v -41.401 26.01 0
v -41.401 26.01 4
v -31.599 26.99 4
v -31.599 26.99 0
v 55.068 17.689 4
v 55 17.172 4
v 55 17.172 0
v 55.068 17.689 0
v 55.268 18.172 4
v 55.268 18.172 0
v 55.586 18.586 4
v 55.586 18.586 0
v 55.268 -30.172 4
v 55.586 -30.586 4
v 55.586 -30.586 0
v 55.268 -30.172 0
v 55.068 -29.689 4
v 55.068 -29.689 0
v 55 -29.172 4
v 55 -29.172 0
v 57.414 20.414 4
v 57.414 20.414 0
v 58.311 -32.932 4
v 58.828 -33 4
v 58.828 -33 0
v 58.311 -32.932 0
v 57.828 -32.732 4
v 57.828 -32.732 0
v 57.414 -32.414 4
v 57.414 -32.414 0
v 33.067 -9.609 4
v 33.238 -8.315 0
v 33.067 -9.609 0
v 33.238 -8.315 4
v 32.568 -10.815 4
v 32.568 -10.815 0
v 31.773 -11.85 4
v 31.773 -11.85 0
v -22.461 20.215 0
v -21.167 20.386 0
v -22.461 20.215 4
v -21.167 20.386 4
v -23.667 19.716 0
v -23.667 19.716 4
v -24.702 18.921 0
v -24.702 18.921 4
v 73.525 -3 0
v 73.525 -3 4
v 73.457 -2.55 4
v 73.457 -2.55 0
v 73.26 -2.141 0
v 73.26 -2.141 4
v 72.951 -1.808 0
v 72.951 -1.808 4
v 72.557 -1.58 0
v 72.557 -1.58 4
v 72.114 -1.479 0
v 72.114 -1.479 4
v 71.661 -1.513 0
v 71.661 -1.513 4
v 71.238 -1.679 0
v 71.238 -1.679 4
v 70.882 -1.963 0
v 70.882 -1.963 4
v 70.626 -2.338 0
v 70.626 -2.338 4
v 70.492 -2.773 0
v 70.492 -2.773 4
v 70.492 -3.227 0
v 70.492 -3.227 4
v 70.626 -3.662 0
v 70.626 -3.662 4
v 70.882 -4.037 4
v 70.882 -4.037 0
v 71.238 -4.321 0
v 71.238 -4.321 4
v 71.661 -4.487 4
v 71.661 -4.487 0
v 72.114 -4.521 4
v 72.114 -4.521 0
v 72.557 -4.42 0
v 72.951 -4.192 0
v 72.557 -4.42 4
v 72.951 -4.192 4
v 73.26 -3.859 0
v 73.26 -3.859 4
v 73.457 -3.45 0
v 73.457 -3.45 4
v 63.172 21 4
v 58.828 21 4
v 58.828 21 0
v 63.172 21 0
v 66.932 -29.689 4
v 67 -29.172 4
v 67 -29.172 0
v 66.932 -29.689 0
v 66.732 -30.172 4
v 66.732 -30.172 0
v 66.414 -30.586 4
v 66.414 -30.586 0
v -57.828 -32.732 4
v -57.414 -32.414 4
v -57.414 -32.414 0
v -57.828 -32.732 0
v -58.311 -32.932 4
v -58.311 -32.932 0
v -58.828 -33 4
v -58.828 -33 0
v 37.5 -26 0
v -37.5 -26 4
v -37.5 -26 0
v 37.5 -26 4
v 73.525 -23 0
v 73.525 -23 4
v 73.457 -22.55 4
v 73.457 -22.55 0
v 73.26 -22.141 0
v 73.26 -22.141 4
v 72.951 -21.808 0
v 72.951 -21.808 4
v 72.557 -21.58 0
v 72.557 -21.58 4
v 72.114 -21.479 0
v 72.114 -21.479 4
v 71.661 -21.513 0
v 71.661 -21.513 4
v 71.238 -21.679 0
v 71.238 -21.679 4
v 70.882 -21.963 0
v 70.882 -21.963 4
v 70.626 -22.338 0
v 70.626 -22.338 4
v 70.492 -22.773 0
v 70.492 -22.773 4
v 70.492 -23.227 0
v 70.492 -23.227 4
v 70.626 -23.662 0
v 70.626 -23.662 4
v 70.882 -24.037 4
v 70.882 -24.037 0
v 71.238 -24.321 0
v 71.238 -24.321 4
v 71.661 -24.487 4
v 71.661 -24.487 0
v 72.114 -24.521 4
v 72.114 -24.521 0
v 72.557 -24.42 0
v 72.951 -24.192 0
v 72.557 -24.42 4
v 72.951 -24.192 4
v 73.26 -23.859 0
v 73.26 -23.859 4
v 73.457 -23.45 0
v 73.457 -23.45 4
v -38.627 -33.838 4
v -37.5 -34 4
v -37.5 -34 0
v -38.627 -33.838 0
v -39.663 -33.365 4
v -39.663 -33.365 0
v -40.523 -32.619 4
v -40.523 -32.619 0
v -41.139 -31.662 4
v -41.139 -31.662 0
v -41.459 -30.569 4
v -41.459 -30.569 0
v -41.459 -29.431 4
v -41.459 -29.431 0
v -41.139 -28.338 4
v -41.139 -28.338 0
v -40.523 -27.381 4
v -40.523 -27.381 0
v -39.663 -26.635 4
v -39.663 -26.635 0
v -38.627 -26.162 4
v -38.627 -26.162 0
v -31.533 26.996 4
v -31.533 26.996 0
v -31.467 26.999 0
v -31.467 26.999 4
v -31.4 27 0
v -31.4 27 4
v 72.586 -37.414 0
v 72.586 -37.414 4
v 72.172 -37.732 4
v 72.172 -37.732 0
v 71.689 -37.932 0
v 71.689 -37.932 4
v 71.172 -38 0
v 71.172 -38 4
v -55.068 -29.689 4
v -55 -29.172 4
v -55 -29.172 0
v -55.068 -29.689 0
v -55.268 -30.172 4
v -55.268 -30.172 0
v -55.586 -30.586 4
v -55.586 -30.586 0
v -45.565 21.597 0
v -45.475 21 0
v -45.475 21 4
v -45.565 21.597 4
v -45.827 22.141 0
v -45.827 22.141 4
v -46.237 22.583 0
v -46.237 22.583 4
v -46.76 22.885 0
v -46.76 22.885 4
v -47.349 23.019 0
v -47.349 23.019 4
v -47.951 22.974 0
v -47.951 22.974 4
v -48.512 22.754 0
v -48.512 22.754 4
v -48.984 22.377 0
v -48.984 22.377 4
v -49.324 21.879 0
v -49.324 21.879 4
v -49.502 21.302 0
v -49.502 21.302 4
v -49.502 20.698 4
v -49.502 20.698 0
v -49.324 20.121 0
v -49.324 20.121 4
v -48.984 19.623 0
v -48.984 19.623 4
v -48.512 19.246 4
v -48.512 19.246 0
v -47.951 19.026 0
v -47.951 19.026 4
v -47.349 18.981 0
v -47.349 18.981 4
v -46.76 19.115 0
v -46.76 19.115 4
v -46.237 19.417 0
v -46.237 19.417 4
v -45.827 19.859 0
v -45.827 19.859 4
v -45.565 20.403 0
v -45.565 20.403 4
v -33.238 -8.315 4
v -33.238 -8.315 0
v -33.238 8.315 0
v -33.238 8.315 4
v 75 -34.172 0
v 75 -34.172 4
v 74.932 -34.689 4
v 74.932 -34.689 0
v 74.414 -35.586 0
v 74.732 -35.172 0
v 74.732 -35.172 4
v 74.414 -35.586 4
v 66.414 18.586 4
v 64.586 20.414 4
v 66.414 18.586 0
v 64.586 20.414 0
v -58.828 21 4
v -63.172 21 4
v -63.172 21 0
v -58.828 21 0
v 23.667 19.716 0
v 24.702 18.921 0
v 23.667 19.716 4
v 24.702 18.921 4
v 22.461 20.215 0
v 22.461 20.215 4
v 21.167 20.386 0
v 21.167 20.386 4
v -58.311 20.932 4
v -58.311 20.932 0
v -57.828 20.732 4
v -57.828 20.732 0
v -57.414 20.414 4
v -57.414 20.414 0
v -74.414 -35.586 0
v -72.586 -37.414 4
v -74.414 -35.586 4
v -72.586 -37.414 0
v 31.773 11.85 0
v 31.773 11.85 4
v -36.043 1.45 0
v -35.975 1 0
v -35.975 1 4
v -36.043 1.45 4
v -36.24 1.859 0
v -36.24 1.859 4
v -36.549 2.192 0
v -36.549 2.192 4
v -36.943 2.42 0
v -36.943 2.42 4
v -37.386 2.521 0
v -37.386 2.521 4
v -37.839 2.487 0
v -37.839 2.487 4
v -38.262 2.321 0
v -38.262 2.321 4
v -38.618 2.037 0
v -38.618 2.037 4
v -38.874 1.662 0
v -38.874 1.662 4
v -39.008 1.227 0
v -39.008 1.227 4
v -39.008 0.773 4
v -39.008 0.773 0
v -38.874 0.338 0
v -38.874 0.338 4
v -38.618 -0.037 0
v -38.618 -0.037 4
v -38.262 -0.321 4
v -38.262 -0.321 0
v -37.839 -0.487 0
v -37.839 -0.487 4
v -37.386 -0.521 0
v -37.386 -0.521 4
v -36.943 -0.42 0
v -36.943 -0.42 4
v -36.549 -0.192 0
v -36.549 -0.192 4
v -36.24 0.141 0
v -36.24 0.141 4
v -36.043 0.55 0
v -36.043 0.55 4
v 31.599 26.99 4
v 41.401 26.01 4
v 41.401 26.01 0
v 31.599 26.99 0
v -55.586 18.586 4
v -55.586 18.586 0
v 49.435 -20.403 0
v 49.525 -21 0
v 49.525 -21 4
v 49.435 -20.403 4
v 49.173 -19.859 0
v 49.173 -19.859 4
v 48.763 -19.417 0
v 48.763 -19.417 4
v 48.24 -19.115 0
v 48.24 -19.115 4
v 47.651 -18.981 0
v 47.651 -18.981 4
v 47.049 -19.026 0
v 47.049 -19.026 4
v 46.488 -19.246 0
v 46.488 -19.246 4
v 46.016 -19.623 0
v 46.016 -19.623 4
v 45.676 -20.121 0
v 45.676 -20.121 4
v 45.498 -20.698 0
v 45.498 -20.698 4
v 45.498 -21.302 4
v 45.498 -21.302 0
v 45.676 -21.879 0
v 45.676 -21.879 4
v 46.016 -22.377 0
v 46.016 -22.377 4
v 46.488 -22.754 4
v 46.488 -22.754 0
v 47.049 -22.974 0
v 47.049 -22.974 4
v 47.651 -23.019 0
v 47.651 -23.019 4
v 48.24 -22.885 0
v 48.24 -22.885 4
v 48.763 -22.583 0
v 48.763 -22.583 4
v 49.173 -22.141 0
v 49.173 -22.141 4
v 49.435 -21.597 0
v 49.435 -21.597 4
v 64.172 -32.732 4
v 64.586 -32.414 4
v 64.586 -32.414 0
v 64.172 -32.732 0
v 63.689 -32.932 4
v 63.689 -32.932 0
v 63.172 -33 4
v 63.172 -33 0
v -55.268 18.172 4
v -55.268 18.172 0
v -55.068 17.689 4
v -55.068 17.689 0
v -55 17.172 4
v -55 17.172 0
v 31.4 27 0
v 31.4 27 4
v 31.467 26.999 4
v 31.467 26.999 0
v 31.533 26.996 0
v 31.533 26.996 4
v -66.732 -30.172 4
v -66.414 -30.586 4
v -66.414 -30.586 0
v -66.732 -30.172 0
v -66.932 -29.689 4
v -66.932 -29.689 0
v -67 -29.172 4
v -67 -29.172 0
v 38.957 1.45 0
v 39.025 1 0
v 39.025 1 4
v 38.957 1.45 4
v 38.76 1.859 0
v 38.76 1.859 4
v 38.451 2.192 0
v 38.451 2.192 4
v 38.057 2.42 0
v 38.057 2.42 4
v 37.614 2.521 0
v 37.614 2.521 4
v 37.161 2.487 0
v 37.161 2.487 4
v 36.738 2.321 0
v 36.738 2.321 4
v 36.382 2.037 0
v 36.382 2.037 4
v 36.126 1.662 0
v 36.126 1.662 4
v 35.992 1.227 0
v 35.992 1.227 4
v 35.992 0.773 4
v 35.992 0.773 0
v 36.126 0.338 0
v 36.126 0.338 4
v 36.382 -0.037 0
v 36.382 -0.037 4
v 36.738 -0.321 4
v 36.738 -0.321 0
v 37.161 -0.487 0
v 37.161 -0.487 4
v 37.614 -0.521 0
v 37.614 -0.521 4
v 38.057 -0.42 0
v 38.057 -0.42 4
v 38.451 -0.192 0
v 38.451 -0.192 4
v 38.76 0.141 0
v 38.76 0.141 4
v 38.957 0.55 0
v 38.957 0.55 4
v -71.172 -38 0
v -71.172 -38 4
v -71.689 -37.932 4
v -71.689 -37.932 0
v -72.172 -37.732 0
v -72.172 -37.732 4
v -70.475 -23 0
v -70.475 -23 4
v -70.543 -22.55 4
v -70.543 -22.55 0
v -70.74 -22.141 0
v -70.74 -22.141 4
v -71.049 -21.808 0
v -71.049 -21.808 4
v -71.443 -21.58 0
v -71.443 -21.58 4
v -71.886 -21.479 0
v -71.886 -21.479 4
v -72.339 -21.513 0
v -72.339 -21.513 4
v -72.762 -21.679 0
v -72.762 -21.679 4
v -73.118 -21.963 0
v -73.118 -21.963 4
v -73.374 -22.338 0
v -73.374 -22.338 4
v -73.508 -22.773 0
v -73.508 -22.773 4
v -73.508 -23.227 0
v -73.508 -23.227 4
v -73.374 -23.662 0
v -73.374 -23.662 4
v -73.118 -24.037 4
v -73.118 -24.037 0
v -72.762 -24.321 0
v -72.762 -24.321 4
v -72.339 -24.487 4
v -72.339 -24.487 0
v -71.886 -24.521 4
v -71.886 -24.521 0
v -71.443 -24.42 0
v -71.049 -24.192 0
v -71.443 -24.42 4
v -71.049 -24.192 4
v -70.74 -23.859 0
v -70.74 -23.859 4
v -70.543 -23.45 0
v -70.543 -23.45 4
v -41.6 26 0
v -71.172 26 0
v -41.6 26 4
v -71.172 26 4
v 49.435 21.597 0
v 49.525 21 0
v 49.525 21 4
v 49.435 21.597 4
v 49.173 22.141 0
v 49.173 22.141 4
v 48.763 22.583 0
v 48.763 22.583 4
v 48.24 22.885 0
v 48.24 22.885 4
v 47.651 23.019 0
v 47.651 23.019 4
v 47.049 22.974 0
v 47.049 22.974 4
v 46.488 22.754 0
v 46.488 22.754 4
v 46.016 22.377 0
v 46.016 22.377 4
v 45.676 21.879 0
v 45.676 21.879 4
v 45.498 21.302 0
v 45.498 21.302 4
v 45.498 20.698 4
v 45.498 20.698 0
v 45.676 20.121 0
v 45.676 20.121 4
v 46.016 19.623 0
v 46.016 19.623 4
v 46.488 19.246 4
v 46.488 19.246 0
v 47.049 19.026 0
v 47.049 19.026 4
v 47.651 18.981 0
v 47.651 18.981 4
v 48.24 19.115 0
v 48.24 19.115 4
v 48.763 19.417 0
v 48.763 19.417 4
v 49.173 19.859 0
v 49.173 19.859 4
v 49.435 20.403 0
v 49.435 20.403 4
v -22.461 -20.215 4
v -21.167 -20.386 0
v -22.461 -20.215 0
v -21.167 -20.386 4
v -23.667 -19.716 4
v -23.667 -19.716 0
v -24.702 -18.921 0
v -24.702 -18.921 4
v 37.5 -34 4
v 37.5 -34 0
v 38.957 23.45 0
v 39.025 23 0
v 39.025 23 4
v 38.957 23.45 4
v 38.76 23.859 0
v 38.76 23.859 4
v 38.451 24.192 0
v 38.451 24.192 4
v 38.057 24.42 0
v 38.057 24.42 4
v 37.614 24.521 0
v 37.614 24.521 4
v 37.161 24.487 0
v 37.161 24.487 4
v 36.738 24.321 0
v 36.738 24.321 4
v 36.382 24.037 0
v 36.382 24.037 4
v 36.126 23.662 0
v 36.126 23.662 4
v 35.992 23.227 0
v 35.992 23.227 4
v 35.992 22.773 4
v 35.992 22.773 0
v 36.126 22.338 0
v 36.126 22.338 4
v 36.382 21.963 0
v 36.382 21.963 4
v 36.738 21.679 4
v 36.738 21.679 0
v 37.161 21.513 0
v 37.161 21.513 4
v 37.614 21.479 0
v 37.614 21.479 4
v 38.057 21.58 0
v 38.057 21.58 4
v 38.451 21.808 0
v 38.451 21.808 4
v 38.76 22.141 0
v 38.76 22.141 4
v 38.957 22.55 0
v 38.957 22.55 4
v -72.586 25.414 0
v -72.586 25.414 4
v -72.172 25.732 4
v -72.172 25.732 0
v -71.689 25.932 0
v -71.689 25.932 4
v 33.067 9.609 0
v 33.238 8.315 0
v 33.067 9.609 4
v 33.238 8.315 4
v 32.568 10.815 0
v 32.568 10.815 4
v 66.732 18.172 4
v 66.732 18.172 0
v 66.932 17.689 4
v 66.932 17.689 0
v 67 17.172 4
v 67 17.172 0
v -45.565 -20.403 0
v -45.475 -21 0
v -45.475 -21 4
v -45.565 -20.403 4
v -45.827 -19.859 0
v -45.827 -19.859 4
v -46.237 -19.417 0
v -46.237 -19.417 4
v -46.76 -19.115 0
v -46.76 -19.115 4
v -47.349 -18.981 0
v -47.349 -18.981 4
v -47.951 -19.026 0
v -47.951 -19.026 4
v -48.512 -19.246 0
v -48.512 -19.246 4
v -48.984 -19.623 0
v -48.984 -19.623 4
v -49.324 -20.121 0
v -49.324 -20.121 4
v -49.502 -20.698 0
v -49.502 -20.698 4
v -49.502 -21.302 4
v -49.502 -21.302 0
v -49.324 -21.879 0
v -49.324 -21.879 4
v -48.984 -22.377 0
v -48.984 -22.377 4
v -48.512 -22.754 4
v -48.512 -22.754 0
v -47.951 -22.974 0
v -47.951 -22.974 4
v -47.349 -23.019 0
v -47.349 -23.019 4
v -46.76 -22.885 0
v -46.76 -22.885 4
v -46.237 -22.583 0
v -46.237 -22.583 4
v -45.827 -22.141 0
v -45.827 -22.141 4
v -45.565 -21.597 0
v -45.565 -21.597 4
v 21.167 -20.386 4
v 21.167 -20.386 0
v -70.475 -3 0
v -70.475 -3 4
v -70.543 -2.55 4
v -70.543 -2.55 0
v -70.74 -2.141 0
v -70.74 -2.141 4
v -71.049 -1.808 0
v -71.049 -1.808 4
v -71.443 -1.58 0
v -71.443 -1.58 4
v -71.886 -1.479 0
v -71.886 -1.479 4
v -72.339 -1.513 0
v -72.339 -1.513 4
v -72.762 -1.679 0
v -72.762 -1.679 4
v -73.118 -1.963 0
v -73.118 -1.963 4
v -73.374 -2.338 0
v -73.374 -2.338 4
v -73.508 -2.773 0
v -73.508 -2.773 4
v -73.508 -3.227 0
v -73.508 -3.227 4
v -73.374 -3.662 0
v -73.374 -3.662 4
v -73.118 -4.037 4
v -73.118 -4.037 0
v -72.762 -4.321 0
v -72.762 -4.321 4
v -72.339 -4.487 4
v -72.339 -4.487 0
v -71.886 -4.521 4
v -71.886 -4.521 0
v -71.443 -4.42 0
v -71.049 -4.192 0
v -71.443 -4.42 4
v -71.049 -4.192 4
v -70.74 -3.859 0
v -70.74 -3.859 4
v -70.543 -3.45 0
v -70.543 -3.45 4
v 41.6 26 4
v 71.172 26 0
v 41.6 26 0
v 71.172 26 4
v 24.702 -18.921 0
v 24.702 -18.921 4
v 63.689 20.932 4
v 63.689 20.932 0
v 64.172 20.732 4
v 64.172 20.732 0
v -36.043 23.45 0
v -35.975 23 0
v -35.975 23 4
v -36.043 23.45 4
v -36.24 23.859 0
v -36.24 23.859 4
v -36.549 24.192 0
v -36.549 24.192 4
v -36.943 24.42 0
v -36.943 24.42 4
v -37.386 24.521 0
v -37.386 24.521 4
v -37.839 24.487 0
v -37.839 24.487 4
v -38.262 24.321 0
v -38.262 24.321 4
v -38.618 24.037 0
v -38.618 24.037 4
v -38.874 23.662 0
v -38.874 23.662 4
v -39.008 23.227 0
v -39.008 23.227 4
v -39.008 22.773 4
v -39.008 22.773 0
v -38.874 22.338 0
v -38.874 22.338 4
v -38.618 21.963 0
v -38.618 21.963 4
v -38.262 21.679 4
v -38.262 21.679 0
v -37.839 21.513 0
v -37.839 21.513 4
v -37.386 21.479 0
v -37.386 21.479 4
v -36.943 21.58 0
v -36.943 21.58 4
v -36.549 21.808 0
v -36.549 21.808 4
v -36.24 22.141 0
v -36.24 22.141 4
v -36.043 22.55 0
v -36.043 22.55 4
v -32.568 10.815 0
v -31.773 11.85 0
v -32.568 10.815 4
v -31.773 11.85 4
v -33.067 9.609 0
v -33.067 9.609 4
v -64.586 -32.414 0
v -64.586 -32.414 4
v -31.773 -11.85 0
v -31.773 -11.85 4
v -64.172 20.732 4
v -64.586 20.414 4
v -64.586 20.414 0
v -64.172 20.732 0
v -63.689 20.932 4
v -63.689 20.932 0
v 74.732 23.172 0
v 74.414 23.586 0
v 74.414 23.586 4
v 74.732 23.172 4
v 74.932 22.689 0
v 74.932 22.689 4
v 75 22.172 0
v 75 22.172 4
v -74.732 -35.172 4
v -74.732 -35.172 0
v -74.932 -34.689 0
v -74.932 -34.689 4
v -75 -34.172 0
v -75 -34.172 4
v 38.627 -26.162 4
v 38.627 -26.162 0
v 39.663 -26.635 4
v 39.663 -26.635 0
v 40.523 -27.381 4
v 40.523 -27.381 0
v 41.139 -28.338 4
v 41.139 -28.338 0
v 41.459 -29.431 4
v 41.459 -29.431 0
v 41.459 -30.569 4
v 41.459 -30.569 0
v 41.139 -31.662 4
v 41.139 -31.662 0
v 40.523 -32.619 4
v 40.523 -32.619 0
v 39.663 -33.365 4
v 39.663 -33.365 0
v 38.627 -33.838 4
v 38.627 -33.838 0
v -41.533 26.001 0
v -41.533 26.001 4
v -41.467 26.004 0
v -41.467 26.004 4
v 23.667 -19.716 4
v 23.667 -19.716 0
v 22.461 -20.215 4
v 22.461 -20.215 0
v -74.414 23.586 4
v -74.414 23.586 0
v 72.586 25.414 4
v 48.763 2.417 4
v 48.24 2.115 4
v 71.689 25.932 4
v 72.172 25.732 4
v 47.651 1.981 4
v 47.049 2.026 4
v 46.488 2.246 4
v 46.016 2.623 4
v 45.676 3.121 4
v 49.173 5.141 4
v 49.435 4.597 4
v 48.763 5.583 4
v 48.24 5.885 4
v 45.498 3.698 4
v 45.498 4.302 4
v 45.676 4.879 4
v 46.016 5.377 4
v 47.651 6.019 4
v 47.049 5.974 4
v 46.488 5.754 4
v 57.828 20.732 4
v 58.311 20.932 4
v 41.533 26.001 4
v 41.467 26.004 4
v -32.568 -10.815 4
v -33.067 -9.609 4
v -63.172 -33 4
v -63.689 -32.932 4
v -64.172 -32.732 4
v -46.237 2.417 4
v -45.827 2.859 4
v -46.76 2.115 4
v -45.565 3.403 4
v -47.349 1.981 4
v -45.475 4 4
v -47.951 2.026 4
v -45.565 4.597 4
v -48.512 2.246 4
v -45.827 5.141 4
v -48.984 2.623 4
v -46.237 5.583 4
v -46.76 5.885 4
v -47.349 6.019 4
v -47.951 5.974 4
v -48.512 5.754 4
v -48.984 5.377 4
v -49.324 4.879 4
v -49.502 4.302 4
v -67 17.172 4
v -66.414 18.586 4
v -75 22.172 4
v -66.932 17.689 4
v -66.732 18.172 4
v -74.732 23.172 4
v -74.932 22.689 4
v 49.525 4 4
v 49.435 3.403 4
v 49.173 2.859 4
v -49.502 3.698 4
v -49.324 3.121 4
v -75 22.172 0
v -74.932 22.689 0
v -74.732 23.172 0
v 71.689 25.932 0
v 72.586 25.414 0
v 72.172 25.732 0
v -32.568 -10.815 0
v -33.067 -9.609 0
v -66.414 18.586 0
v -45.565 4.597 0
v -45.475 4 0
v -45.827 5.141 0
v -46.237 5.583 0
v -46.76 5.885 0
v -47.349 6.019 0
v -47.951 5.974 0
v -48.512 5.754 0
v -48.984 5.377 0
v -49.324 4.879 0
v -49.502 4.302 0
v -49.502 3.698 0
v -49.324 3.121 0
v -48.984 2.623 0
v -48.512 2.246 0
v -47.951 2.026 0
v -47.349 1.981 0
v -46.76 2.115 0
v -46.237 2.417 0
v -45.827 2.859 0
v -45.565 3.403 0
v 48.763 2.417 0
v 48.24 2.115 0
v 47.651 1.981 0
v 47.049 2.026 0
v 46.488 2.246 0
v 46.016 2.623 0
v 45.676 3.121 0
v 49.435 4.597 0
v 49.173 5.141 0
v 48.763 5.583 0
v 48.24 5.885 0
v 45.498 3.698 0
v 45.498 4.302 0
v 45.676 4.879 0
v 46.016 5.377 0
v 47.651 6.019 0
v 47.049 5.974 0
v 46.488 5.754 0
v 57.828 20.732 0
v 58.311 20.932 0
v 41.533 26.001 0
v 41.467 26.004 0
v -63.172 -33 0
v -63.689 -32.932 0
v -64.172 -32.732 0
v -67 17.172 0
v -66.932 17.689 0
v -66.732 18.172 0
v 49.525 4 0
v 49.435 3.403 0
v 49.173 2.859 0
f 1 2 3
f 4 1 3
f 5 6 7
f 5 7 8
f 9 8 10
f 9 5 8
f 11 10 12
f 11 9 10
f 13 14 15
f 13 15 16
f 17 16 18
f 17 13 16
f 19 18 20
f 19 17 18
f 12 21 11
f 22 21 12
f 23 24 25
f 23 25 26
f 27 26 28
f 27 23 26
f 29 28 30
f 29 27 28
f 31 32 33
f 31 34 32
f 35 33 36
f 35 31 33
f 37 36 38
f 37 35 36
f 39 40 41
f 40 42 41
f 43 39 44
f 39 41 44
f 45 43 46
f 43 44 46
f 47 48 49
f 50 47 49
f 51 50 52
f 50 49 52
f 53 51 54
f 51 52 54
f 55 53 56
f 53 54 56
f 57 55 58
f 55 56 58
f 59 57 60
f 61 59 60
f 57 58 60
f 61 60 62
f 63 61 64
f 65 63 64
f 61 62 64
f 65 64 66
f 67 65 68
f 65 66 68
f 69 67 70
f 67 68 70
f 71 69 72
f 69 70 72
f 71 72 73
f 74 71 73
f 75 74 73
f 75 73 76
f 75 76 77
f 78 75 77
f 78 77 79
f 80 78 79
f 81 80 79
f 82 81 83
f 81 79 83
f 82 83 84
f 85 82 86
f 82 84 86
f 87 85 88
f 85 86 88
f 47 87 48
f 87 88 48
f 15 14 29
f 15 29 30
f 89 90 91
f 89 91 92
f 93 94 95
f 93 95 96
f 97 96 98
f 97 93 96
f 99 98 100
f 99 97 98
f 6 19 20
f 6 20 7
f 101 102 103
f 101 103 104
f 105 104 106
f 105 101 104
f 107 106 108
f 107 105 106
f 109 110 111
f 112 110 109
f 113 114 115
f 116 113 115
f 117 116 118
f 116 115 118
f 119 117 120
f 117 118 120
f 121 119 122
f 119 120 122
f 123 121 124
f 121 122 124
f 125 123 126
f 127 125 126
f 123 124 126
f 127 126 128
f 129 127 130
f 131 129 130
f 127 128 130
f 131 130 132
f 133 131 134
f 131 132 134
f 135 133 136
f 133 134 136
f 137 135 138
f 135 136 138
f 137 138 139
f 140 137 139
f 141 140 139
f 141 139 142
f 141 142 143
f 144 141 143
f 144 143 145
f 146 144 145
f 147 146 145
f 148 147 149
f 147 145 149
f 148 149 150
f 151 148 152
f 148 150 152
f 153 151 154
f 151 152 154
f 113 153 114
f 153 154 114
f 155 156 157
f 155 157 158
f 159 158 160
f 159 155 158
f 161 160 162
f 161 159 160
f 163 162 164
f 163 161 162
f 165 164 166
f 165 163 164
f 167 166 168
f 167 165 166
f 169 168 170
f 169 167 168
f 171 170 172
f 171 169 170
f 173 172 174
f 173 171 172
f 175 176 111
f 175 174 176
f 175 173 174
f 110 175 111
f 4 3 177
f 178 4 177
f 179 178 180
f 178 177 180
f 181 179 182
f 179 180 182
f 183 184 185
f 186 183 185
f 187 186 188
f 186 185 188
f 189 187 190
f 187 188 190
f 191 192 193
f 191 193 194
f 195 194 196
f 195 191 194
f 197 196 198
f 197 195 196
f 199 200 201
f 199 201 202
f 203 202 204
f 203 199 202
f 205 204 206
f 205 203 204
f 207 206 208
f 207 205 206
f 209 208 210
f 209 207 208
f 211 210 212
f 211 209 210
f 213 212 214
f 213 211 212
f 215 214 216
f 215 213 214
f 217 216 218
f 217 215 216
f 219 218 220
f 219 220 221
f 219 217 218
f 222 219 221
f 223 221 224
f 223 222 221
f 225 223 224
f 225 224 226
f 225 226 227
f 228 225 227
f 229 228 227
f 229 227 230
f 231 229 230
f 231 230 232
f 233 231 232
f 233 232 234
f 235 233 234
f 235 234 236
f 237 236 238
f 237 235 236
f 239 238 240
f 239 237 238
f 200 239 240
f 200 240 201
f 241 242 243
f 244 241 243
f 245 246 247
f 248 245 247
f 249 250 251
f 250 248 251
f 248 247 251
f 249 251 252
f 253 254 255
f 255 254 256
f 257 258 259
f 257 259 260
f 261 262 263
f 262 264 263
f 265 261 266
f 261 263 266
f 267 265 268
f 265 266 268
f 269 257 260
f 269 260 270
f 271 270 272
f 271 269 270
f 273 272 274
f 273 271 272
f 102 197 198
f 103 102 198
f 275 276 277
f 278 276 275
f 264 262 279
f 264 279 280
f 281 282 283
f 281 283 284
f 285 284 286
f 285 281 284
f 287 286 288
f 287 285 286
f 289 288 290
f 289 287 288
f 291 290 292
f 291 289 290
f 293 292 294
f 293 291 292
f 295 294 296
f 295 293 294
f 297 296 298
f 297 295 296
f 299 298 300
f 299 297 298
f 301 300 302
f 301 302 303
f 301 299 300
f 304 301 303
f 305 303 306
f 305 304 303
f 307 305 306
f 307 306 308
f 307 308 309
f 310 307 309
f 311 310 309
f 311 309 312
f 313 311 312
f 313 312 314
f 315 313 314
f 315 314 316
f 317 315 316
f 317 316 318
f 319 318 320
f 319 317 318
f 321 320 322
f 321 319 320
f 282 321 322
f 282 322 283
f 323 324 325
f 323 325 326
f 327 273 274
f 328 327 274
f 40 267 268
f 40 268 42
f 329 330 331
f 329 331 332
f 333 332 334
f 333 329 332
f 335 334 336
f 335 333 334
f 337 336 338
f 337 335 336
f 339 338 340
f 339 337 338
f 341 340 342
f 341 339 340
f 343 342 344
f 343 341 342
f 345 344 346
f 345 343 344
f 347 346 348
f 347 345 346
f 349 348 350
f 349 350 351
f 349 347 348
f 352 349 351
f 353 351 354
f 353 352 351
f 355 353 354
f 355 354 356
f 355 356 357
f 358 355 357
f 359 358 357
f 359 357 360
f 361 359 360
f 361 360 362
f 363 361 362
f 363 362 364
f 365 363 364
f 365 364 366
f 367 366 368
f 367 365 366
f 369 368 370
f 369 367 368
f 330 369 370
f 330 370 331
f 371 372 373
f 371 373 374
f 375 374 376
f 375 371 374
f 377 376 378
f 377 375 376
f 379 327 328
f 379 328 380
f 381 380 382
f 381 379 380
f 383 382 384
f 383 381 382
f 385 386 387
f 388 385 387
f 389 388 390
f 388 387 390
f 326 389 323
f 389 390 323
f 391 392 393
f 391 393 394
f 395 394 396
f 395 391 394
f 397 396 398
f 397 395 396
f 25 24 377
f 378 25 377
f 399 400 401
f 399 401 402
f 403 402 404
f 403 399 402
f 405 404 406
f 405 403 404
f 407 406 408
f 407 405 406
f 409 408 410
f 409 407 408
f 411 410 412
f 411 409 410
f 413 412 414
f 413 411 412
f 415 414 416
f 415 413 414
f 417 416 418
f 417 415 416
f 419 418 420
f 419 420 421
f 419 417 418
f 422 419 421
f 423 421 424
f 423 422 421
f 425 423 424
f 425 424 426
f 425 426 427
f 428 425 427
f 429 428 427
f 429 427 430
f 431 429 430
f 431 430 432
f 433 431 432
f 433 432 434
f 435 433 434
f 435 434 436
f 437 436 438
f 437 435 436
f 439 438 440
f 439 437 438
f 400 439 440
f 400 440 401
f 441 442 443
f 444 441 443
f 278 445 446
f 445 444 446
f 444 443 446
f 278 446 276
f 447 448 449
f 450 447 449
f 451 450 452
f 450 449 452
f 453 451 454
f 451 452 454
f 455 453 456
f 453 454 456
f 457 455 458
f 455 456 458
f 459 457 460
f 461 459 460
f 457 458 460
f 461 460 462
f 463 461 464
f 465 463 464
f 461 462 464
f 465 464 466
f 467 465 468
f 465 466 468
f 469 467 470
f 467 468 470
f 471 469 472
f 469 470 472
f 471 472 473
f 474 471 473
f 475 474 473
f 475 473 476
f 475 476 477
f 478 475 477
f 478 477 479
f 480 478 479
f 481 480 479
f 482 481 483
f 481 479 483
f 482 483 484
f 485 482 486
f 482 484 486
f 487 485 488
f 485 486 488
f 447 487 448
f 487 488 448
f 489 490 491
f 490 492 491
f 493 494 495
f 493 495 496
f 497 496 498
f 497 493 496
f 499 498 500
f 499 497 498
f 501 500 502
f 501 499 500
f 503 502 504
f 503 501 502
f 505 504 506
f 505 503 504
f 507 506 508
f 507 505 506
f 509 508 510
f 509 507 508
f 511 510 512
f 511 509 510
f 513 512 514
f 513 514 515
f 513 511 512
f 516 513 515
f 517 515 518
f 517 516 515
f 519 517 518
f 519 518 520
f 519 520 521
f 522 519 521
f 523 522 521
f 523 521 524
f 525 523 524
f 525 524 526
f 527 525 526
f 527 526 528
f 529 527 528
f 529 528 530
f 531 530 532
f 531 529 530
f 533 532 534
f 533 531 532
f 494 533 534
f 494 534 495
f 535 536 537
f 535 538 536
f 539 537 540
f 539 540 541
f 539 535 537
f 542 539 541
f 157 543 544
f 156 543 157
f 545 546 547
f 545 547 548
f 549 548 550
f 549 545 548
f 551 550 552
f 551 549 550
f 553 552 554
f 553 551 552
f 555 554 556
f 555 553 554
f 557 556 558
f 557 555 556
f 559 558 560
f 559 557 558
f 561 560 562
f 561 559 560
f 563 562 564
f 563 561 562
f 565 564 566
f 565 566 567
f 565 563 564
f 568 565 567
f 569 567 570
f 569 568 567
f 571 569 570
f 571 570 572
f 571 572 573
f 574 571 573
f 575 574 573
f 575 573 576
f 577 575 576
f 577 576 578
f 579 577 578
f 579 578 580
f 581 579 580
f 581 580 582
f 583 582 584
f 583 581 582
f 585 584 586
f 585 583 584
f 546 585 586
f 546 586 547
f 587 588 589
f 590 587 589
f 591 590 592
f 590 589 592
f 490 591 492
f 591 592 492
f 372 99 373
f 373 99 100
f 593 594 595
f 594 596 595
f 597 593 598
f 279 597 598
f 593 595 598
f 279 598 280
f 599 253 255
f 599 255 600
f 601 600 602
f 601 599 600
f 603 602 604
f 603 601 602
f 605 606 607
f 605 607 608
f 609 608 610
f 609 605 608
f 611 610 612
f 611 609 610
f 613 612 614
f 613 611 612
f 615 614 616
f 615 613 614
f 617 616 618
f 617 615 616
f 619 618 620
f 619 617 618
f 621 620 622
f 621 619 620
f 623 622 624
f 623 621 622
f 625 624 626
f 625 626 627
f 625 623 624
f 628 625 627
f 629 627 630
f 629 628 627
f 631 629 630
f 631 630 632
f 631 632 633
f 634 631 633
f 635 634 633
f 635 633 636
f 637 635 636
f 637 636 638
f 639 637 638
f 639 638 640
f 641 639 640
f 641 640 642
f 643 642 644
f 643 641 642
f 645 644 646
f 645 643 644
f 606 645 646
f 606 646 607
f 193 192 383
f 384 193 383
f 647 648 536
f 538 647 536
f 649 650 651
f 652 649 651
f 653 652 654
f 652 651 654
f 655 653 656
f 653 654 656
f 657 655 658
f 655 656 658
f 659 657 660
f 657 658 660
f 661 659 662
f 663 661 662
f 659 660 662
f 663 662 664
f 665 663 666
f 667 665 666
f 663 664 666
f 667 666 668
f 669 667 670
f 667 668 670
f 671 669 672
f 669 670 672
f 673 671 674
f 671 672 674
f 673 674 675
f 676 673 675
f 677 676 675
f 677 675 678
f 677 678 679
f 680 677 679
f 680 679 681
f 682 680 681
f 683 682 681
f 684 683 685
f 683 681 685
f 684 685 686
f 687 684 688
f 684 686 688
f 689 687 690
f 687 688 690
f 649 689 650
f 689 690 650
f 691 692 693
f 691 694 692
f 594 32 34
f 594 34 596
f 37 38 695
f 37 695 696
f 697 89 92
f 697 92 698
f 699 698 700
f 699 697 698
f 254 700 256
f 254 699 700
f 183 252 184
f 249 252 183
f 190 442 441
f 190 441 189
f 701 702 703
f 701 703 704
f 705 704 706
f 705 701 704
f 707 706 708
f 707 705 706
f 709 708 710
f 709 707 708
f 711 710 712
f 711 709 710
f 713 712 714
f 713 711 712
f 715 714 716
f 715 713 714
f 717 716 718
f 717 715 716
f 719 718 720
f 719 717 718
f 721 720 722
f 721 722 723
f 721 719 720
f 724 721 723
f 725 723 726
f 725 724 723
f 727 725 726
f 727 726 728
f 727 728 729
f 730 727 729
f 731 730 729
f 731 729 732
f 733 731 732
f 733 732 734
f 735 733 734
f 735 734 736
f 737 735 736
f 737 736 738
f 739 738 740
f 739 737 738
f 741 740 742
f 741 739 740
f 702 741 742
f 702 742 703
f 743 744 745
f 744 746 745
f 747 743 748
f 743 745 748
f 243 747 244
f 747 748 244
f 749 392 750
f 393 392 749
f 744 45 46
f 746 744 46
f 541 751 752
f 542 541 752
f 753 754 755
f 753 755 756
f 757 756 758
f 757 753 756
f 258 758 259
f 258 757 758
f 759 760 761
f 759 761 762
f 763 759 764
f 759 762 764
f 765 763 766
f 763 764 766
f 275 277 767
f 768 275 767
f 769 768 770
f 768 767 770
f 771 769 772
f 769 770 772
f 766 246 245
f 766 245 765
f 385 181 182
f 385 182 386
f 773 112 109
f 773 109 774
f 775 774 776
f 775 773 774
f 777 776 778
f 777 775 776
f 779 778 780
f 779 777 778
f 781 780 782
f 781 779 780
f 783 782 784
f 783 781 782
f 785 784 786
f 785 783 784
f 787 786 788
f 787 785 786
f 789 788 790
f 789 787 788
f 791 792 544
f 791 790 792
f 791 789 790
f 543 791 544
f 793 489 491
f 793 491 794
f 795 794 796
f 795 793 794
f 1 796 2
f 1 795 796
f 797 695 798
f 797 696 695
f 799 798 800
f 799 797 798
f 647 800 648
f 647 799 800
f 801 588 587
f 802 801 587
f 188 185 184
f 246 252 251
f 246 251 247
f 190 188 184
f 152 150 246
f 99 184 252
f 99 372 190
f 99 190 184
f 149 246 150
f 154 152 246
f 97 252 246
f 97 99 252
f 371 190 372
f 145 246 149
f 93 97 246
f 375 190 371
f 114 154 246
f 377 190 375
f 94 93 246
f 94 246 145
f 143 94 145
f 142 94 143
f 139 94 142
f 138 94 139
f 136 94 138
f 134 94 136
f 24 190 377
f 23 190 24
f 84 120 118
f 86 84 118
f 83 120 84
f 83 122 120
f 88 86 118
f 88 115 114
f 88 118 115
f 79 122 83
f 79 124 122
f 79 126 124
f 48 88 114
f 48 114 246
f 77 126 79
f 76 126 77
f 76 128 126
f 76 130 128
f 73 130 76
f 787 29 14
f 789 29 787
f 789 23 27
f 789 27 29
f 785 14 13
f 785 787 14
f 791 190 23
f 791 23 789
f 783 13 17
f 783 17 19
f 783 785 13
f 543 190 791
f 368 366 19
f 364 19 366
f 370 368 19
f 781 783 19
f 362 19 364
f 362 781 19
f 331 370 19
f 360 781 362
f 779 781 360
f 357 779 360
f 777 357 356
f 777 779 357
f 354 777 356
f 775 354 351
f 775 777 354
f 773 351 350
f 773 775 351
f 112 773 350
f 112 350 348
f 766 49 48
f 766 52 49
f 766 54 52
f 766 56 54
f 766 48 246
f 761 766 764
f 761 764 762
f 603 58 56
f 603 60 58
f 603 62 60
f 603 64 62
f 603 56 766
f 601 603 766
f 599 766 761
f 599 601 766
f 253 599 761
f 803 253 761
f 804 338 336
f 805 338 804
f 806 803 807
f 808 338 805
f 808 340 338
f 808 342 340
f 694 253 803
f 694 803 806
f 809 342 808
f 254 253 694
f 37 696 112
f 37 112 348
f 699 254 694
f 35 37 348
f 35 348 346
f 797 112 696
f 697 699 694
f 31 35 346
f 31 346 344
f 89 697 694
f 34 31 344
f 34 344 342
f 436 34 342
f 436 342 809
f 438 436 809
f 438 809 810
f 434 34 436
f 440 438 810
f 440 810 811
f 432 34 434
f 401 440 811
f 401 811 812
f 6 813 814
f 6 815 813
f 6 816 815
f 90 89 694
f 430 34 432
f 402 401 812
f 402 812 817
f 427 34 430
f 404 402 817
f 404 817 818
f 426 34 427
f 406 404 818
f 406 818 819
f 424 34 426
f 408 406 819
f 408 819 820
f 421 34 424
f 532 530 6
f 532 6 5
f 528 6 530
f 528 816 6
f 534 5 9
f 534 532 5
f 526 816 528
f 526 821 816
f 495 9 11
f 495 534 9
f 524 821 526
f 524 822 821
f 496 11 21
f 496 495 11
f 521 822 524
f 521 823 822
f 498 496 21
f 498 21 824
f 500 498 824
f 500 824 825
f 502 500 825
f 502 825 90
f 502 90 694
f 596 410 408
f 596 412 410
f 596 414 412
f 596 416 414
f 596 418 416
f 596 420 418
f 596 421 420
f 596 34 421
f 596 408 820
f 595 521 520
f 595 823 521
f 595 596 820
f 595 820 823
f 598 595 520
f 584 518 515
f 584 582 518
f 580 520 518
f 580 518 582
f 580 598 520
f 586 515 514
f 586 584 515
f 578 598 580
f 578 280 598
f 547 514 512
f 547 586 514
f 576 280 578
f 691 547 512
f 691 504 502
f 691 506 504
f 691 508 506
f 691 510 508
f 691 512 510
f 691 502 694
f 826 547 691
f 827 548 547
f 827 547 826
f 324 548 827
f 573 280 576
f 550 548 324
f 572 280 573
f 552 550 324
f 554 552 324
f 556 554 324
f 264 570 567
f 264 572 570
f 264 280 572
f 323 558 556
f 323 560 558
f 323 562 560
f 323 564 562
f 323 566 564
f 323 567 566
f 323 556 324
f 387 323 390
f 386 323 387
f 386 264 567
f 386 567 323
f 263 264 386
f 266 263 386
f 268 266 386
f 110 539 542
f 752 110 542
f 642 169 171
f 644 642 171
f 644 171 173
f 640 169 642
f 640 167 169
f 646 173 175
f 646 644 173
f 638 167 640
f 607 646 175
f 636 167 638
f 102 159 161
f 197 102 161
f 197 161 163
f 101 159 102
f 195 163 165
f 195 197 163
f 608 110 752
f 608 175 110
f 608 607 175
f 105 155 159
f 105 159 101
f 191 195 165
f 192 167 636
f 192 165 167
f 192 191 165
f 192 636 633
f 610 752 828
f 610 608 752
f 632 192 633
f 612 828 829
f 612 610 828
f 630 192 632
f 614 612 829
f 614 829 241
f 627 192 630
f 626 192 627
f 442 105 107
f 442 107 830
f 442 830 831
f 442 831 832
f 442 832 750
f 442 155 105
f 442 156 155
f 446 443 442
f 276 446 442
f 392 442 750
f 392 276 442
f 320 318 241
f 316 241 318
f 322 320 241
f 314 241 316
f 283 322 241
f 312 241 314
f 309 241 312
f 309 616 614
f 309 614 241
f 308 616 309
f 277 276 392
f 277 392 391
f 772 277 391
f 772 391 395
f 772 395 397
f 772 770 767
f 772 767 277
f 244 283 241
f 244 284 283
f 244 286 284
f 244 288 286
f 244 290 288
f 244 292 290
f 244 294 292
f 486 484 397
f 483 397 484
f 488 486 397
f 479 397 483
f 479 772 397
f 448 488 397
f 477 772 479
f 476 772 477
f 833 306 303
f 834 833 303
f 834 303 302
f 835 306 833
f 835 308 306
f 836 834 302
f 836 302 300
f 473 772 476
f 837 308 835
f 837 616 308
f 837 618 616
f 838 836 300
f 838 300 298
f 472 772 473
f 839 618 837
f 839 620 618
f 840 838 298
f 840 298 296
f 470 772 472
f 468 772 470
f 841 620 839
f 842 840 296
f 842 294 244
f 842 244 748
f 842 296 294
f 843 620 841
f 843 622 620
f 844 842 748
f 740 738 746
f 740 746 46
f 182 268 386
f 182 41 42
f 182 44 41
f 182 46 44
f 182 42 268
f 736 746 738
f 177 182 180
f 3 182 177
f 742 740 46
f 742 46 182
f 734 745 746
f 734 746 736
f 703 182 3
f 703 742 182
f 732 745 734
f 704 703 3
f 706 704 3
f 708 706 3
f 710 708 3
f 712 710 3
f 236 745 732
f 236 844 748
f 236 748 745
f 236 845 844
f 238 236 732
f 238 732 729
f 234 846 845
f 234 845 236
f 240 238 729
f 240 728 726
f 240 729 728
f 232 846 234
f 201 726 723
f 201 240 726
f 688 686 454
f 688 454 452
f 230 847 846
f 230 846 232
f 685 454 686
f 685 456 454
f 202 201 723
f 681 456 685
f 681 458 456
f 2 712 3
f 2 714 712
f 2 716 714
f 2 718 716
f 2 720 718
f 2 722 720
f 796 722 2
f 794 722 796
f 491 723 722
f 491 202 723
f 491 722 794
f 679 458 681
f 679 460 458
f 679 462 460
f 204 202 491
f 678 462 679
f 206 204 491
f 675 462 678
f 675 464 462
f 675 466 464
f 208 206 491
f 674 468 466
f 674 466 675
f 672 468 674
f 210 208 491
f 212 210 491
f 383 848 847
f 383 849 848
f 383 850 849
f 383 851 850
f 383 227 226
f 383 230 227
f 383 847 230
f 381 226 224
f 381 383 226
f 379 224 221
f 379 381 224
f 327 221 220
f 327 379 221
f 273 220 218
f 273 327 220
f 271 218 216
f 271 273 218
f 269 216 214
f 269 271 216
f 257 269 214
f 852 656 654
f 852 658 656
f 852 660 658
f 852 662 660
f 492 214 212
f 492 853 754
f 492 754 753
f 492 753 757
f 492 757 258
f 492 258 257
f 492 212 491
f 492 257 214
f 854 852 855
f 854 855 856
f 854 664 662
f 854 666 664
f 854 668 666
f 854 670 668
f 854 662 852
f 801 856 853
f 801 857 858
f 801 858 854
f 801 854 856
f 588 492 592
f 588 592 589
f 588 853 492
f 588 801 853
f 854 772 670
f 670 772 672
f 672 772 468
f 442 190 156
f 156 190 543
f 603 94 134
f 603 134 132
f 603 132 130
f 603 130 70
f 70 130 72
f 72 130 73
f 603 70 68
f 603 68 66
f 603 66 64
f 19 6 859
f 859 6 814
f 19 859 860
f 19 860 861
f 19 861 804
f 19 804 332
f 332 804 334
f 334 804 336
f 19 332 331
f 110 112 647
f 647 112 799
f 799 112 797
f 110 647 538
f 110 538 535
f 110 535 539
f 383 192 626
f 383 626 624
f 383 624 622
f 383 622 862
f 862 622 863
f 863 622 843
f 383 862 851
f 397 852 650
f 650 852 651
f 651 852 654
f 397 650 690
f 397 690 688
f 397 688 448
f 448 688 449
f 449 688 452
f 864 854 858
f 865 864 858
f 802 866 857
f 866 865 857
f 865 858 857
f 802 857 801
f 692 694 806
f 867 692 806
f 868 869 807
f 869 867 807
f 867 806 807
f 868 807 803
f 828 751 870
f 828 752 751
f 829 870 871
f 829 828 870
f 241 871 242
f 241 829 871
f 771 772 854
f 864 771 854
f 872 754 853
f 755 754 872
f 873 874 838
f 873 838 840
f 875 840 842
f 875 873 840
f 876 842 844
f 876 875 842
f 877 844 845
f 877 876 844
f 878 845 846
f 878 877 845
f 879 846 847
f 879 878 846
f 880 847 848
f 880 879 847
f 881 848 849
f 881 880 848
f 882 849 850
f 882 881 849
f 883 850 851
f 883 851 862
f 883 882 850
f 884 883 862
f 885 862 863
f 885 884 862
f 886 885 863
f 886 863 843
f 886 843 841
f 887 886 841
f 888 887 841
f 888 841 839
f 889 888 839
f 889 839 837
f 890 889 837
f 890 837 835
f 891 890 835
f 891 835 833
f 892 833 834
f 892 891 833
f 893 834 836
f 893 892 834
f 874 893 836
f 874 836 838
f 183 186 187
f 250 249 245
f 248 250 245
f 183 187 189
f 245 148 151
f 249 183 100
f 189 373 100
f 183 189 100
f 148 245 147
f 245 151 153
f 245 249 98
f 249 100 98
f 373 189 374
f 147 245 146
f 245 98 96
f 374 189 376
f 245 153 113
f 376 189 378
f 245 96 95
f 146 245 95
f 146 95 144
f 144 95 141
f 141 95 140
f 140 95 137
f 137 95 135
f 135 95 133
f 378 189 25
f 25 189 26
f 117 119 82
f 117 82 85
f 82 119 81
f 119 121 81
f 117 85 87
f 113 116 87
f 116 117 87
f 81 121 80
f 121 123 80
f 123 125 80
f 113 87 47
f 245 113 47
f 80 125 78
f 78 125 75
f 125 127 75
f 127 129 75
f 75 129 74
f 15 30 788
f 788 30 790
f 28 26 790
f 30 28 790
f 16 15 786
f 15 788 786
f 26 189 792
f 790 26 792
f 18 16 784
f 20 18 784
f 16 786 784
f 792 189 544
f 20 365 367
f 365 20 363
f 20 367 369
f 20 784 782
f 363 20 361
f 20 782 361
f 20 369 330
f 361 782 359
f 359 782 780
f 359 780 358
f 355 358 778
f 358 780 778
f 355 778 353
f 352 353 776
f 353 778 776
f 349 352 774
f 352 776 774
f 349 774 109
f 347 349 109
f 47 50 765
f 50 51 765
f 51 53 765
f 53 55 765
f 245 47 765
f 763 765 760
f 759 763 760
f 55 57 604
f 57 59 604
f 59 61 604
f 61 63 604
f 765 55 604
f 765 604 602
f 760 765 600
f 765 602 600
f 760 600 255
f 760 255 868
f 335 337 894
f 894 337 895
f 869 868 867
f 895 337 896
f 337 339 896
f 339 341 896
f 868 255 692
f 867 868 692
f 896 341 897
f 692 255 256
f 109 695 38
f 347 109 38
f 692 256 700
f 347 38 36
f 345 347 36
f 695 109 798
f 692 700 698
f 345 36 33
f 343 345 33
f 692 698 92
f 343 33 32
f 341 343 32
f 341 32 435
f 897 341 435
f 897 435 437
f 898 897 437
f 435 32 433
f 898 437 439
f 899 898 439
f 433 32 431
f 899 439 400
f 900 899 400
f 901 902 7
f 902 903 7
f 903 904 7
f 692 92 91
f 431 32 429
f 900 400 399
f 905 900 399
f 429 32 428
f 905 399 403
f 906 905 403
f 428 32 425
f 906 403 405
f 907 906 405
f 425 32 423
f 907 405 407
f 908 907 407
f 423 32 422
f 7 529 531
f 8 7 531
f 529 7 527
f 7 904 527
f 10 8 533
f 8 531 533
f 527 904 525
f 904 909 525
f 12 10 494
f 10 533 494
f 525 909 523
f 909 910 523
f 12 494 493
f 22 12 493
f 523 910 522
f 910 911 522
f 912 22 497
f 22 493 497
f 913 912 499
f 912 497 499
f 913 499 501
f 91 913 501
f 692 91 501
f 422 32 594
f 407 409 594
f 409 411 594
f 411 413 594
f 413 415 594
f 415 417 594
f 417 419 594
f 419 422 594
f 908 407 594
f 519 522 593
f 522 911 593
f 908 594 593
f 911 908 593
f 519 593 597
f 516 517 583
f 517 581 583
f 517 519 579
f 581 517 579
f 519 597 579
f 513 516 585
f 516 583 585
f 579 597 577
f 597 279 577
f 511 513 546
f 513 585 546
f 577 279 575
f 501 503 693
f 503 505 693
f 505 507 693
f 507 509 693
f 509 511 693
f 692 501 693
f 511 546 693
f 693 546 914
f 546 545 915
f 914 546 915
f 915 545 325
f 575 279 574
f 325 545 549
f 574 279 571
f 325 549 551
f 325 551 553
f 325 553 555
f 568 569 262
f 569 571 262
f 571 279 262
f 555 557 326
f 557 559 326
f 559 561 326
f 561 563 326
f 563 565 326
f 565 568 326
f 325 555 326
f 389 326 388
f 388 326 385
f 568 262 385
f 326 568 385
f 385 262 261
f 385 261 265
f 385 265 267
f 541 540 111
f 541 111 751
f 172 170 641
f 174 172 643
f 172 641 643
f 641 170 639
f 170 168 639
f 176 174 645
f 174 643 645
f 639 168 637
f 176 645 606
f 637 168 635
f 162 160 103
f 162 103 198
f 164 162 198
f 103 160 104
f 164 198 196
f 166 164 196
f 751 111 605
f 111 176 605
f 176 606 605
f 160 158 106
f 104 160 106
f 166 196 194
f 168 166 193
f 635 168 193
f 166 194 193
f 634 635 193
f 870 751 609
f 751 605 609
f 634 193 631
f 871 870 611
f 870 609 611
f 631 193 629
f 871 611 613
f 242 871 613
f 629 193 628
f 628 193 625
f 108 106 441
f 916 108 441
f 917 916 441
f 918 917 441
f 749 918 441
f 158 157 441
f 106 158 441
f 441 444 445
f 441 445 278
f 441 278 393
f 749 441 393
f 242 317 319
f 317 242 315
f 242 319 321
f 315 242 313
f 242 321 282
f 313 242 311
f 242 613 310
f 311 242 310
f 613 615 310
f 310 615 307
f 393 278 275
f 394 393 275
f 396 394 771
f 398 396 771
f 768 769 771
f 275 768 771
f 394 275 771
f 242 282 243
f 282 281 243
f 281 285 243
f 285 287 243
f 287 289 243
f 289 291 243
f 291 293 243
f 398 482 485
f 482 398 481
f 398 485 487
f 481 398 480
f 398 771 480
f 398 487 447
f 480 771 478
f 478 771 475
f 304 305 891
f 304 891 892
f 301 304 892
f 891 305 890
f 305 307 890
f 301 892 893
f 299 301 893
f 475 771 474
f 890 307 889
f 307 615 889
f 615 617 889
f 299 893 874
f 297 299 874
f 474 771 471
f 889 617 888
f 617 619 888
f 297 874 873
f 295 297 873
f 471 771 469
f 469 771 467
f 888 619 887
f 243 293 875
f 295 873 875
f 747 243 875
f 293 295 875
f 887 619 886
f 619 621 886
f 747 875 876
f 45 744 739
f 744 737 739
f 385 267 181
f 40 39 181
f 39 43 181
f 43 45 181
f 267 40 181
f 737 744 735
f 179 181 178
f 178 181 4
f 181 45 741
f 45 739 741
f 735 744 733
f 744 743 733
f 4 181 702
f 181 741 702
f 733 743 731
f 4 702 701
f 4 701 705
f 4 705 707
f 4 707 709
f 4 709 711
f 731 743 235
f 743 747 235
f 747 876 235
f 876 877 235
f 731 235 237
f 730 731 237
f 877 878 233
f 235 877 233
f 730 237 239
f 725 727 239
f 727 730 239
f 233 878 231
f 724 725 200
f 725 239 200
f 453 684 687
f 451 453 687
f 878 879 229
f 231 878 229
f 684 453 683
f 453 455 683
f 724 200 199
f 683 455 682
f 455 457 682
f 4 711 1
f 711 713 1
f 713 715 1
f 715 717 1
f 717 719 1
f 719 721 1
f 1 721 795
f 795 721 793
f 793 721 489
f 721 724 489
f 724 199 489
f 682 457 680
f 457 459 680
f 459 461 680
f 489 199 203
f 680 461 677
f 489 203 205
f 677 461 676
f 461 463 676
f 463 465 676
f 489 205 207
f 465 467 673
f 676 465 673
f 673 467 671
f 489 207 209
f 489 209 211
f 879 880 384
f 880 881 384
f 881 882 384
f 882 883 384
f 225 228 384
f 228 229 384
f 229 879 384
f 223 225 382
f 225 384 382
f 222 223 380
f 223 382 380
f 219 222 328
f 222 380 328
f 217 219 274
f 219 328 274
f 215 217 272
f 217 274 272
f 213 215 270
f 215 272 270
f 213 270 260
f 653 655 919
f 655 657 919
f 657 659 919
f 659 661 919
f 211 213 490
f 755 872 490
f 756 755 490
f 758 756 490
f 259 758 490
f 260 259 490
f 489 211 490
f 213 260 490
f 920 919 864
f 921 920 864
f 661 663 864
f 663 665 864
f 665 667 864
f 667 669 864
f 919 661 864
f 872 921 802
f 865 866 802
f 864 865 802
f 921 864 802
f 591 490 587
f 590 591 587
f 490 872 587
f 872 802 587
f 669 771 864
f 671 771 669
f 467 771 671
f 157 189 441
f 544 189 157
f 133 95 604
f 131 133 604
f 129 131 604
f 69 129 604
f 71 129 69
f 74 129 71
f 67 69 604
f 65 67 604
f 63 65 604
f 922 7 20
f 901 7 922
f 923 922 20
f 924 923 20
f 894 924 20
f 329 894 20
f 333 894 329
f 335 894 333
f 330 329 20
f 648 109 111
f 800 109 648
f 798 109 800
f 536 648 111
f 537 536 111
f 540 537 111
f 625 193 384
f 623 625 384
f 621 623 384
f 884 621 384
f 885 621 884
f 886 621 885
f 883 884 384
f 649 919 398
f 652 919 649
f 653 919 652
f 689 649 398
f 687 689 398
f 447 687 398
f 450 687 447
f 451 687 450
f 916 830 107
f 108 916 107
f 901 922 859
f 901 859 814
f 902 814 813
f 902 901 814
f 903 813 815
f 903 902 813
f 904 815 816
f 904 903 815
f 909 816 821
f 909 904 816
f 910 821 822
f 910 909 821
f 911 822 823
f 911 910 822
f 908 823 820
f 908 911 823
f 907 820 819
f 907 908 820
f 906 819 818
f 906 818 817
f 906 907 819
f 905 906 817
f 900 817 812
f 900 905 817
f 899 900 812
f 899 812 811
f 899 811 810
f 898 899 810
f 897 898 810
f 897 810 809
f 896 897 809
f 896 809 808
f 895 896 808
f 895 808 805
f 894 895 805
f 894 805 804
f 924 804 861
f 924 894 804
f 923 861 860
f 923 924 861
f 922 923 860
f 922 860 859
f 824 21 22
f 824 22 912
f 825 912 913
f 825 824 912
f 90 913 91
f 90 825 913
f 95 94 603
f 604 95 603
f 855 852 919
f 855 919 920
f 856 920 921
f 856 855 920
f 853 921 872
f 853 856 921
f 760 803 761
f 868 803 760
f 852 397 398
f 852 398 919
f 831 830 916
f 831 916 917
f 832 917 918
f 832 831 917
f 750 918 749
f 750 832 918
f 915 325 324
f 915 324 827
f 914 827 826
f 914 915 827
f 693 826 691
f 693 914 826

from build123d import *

# Parameters (mm, degrees)
SKETCH_1_W          = 105
SKETCH_1_H          = 52
SKETCH_1_R          = 2.025
SKETCH_1_R_2        = 1.525
SKETCH_1_W_2        = 83
SKETCH_1_H_2        = 1
EXTRUDE_3_DEPTH     = 4
SKETCH_3_W          = 105
SKETCH_3_H          = 12
EXTRUDE_4_DEPTH     = 4
SKETCH_6_W          = 66.47562141
SKETCH_6_H          = 40.771714464
CUT_EXTRUDE_1_DEPTH = 4
CHAMFER_1_SIZE      = 10
FILLET_2_R          = 5
SKETCH_7_W          = 20
SKETCH_7_H          = 64
SKETCH_7_R          = 1.525
EXTRUDE_5_DEPTH     = 4
SKETCH_8_W          = 12
SKETCH_8_H          = 54
CUT_EXTRUDE_2_DEPTH = 10
CUT_EXTRUDE_3_DEPTH = 10
CHAMFER_2_SIZE      = 3
FILLET_3_R          = 2


with BuildPart() as part:
    # 草图1 → 凸台-拉伸3 (new body)
    # profile 1 of 2: a face of its own
    with BuildSketch(Plane.XY):
        Rectangle(SKETCH_1_W, SKETCH_1_H)
        with Locations((-47.5, 4)):
            Circle(SKETCH_1_R, mode=Mode.SUBTRACT)
        with Locations((-47.5, 21)):
            Circle(SKETCH_1_R, mode=Mode.SUBTRACT)
        with Locations((-47.5, -21)):
            Circle(SKETCH_1_R, mode=Mode.SUBTRACT)
        with Locations((47.5, 21)):
            Circle(SKETCH_1_R, mode=Mode.SUBTRACT)
        with Locations((47.5, 4)):
            Circle(SKETCH_1_R, mode=Mode.SUBTRACT)
        with Locations((47.5, -21)):
            Circle(SKETCH_1_R, mode=Mode.SUBTRACT)
        with Locations((-37.5, 23)):
            Circle(SKETCH_1_R_2, mode=Mode.SUBTRACT)
        with Locations((-37.5, 1)):
            Circle(SKETCH_1_R_2, mode=Mode.SUBTRACT)
        with Locations((37.5, 23)):
            Circle(SKETCH_1_R_2, mode=Mode.SUBTRACT)
        with Locations((37.5, 1)):
            Circle(SKETCH_1_R_2, mode=Mode.SUBTRACT)
    # profile 2 of 2: a face of its own
    with BuildSketch(Plane.XY):
        with Locations((0, 26.5)):
            Rectangle(SKETCH_1_W_2, SKETCH_1_H_2)
    extrude(amount=EXTRUDE_3_DEPTH)

    # 草图3 → 凸台-拉伸4 (add)
    with BuildSketch(Plane.XY.offset(4)):
        with Locations((0, -32)):
            Rectangle(SKETCH_3_W, SKETCH_3_H)
        Polygon((-52.5, -26), (-52.5, 26), (-55, 26), (-55, -38), (-52.5, -38), align=None)
        Polygon((52.5, -38), (55, -38), (55, 26), (52.5, 26), (52.5, -26), align=None)
    extrude(amount=-EXTRUDE_4_DEPTH)

    # 草图6 → 切除-拉伸1 (cut)
    with BuildSketch(Plane(origin=(0, 0, 0), x_dir=(-1, 0, 0), z_dir=(0, 0, -1))):
        Rectangle(SKETCH_6_W, SKETCH_6_H)
    extrude(amount=-CUT_EXTRUDE_1_DEPTH, mode=Mode.SUBTRACT)

    # 倒角1
    chamfer_1_edges = [part.edges().sort_by_distance(p)[0] for p in [
        (-33.237810705, -20.385857232, 2),
        (33.237810705, -20.385857232, 2),
        (33.237810705, 20.385857232, 2),
        (-33.237810705, 20.385857232, 2),
    ]]
    chamfer(chamfer_1_edges, length=CHAMFER_1_SIZE)

    # 圆角2
    fillet_2_edges = [part.edges().sort_by_distance(p)[0] for p in [
        (-33.237810705, 10.385857232, 2),
        (-33.237810705, -10.385857232, 2),
        (23.237810705, -20.385857232, 2),
        (-23.237810705, -20.385857232, 2),
        (23.237810705, 20.385857232, 2),
        (-23.237810705, 20.385857232, 2),
        (33.237810705, -10.385857232, 2),
        (33.237810705, 10.385857232, 2),
    ]]
    fillet(fillet_2_edges, radius=FILLET_2_R)

    # 草图7 → 凸台-拉伸5 (add)
    # profile 1 of 2: a face of its own
    with BuildSketch(Plane.XY.offset(4)):
        with Locations((-65, -6)):
            Rectangle(SKETCH_7_W, SKETCH_7_H)
        with Locations((-72, -3)):
            Circle(SKETCH_7_R, mode=Mode.SUBTRACT)
        with Locations((-72, -23)):
            Circle(SKETCH_7_R, mode=Mode.SUBTRACT)
    # profile 2 of 2: a face of its own
    with BuildSketch(Plane.XY.offset(4)):
        with Locations((65, -6)):
            Rectangle(SKETCH_7_W, SKETCH_7_H)
        with Locations((72, -23)):
            Circle(SKETCH_7_R, mode=Mode.SUBTRACT)
        with Locations((72, -3)):
            Circle(SKETCH_7_R, mode=Mode.SUBTRACT)
    extrude(amount=-EXTRUDE_5_DEPTH)

    # 草图8 → 切除-拉伸2 (cut)
    with BuildSketch(Plane.XY.offset(4)):
        with Locations((-61, -6)):
            Rectangle(SKETCH_8_W, SKETCH_8_H)
        with Locations((61, -6)):
            Rectangle(SKETCH_8_W, SKETCH_8_H)
    extrude(amount=-CUT_EXTRUDE_2_DEPTH, mode=Mode.SUBTRACT)

    # 草图9 → 切除-拉伸3 (cut)
    with BuildSketch(Plane.XY.offset(4)):
        Polygon((41.5, 26), (31.5, 27), (41.5, 27), align=None)
        Polygon((-41.5, 27), (-41.5, 26), (-31.5, 27), align=None)
        with BuildLine():
            Line((-37.5, -26), (37.5, -26))
            ThreePointArc((37.5, -26), (41.5, -30), (37.5, -34))
            Line((37.5, -34), (-37.5, -34))
            ThreePointArc((-37.5, -34), (-41.5, -30), (-37.5, -26))
        make_face()
    extrude(amount=-CUT_EXTRUDE_3_DEPTH, mode=Mode.SUBTRACT)

    # 倒角2
    chamfer_2_edges = [part.edges().sort_by_distance(p)[0] for p in [
        (-75, 26, 2),
        (-75, -38, 2),
        (75, -38, 2),
        (75, 26, 2),
        (-67, -33, 2),
        (-67, 21, 2),
        (-55, 21, 2),
        (-55, -33, 2),
        (67, 21, 2),
        (67, -33, 2),
        (55, -33, 2),
        (55, 21, 2),
    ]]
    chamfer(chamfer_2_edges, length=CHAMFER_2_SIZE)

    # 圆角3
    # the kernel refuses this fillet: 2 mm, written as the material it adds along each edge
    with BuildSketch(Plane(origin=(41.5, 26, 0), x_dir=(1, 0, 0), z_dir=(0, 0, 1)), Plane(origin=(-41.5, 26, 0), x_dir=(0.9950371902099869, 0.09950371902102007, 0), z_dir=(0, 0, 1))) as fillet_3_piece_1:
        with BuildLine():
            CenterArc((FILLET_3_R * 0.0498756211208, FILLET_3_R), FILLET_3_R, 264.289406863, 5.710593137)
            Line((-FILLET_3_R * 0.0496280979001, FILLET_3_R * 0.00496280979), (0, 0))
            Line((0, 0), (FILLET_3_R * 0.0498756211209, 0))
        make_face()
    extrude(amount=4)
    with BuildSketch(Plane(origin=(-58, -33, 4), x_dir=(-1, 0, 0), z_dir=(0, 0, -1)), Plane(origin=(-64, -33, 4), x_dir=(-0.7071067811865475, 0.7071067811865475, 0), z_dir=(0, 0, -1)), Plane(origin=(-67, -30, 4), x_dir=(0, 1, 0), z_dir=(0, 0, -1)), Plane(origin=(-55, -30, 4), x_dir=(-0.7071067811865454, -0.7071067811865497, 0), z_dir=(0, 0, -1)), Plane(origin=(55, 18, 4), x_dir=(0.7071067811865475, 0.7071067811865475, 0), z_dir=(0, 0, -1)), Plane(origin=(67, 18, 4), x_dir=(0, -1, 0), z_dir=(0, 0, -1)), Plane(origin=(64, 21, 4), x_dir=(0.7071067811865475, -0.7071067811865475, 0), z_dir=(0, 0, -1)), Plane(origin=(58, 21, 4), x_dir=(1, 0, 0), z_dir=(0, 0, -1))) as fillet_3_piece_2:
        with BuildLine():
            CenterArc((FILLET_3_R * 0.414213562373, FILLET_3_R), FILLET_3_R, 225, 45)
            Line((-FILLET_3_R * 0.292893218813, FILLET_3_R * 0.292893218813), (0, 0))
            Line((0, 0), (FILLET_3_R * 0.414213562373, 0))
        make_face()
    extrude(amount=4)
    with BuildSketch(Plane(origin=(-67, 18, 4), x_dir=(0, -1, 0), z_dir=(0, 0, -1)), Plane(origin=(-55, 18, 4), x_dir=(-0.7071067811865475, 0.7071067811865475, 0), z_dir=(0, 0, -1)), Plane(origin=(-58, 21, 4), x_dir=(-1, 0, 0), z_dir=(0, 0, -1)), Plane(origin=(-64, 21, 4), x_dir=(-0.7071067811865475, -0.7071067811865475, 0), z_dir=(0, 0, -1)), Plane(origin=(64, -33, 4), x_dir=(0.7071067811865475, 0.7071067811865475, 0), z_dir=(0, 0, -1)), Plane(origin=(58, -33, 4), x_dir=(1, 0, 0), z_dir=(0, 0, -1)), Plane(origin=(55, -30, 4), x_dir=(0.7071067811865475, -0.7071067811865475, 0), z_dir=(0, 0, -1)), Plane(origin=(67, -30, 4), x_dir=(0, 1, 0), z_dir=(0, 0, -1))) as fillet_3_piece_3:
        with BuildLine():
            CenterArc((FILLET_3_R * 0.414213562373, -FILLET_3_R), FILLET_3_R, 90, 45)
            Line((-FILLET_3_R * 0.292893218813, -FILLET_3_R * 0.292893218813), (0, 0))
            Line((0, 0), (FILLET_3_R * 0.414213562373, 0))
        make_face()
    extrude(amount=4)
    # the kernel refuses this fillet: 2 mm, written as the material it takes off along each edge
    with BuildSketch(Plane(origin=(-31.5, 27, 4.249378106), x_dir=(1, 0, 0), z_dir=(0, 0, -1)), Plane(origin=(31.5, 27, 4.249378106), x_dir=(0.9950371902099905, -0.0995037190209848, 0), z_dir=(0, 0, -1))) as fillet_3_2_piece_1:
        with BuildLine():
            CenterArc((FILLET_3_R * 0.0498756211209, FILLET_3_R), FILLET_3_R, 264.289406863, 5.710593137)
            Line((-FILLET_3_R * 0.0496280979001, FILLET_3_R * 0.00496280979001), (0, 0))
            Line((0, 0), (FILLET_3_R * 0.0498756211209, 0))
        make_face()
    extrude(amount=4.498756211, mode=Mode.SUBTRACT)
    with BuildSketch(Plane(origin=(-72, -38, 6.071067812), x_dir=(1, 0, 0), z_dir=(0, 0, -1)), Plane(origin=(72, -38, 6.071067812), x_dir=(0.7071067811865475, 0.7071067811865475, 0), z_dir=(0, 0, -1)), Plane(origin=(75, 23, 6.071067812), x_dir=(-0.7071067811865475, 0.7071067811865475, 0), z_dir=(0, 0, -1)), Plane(origin=(75, -35, 6.071067812), x_dir=(0, 1, 0), z_dir=(0, 0, -1)), Plane(origin=(72, 26, 6.071067812), x_dir=(-1, 0, 0), z_dir=(0, 0, -1)), Plane(origin=(-75, -35, 6.071067812), x_dir=(0.7071067811865475, -0.7071067811865475, 0), z_dir=(0, 0, -1))) as fillet_3_2_piece_2:
        with BuildLine():
            CenterArc((FILLET_3_R * 0.414213562373, -FILLET_3_R), FILLET_3_R, 90, 45)
            Line((-FILLET_3_R * 0.292893218813, -FILLET_3_R * 0.292893218813), (0, 0))
            Line((0, 0), (FILLET_3_R * 0.414213562373, 0))
        make_face()
    extrude(amount=8.142135624, mode=Mode.SUBTRACT)
    with BuildSketch(Plane(origin=(-72, 26, 6.071067812), x_dir=(1, 0, 0), z_dir=(0, 0, -1)), Plane(origin=(-75, 23, 6.071067812), x_dir=(0.7071067811865497, 0.7071067811865454, 0), z_dir=(0, 0, -1))) as fillet_3_2_piece_3:
        with BuildLine():
            CenterArc((FILLET_3_R * 0.414213562373, FILLET_3_R), FILLET_3_R, 225, 45)
            Line((-FILLET_3_R * 0.292893218813, FILLET_3_R * 0.292893218813), (0, 0))
            Line((0, 0), (FILLET_3_R * 0.414213562373, 0))
        make_face()
    extrude(amount=8.142135624, mode=Mode.SUBTRACT)


solid = part.part
